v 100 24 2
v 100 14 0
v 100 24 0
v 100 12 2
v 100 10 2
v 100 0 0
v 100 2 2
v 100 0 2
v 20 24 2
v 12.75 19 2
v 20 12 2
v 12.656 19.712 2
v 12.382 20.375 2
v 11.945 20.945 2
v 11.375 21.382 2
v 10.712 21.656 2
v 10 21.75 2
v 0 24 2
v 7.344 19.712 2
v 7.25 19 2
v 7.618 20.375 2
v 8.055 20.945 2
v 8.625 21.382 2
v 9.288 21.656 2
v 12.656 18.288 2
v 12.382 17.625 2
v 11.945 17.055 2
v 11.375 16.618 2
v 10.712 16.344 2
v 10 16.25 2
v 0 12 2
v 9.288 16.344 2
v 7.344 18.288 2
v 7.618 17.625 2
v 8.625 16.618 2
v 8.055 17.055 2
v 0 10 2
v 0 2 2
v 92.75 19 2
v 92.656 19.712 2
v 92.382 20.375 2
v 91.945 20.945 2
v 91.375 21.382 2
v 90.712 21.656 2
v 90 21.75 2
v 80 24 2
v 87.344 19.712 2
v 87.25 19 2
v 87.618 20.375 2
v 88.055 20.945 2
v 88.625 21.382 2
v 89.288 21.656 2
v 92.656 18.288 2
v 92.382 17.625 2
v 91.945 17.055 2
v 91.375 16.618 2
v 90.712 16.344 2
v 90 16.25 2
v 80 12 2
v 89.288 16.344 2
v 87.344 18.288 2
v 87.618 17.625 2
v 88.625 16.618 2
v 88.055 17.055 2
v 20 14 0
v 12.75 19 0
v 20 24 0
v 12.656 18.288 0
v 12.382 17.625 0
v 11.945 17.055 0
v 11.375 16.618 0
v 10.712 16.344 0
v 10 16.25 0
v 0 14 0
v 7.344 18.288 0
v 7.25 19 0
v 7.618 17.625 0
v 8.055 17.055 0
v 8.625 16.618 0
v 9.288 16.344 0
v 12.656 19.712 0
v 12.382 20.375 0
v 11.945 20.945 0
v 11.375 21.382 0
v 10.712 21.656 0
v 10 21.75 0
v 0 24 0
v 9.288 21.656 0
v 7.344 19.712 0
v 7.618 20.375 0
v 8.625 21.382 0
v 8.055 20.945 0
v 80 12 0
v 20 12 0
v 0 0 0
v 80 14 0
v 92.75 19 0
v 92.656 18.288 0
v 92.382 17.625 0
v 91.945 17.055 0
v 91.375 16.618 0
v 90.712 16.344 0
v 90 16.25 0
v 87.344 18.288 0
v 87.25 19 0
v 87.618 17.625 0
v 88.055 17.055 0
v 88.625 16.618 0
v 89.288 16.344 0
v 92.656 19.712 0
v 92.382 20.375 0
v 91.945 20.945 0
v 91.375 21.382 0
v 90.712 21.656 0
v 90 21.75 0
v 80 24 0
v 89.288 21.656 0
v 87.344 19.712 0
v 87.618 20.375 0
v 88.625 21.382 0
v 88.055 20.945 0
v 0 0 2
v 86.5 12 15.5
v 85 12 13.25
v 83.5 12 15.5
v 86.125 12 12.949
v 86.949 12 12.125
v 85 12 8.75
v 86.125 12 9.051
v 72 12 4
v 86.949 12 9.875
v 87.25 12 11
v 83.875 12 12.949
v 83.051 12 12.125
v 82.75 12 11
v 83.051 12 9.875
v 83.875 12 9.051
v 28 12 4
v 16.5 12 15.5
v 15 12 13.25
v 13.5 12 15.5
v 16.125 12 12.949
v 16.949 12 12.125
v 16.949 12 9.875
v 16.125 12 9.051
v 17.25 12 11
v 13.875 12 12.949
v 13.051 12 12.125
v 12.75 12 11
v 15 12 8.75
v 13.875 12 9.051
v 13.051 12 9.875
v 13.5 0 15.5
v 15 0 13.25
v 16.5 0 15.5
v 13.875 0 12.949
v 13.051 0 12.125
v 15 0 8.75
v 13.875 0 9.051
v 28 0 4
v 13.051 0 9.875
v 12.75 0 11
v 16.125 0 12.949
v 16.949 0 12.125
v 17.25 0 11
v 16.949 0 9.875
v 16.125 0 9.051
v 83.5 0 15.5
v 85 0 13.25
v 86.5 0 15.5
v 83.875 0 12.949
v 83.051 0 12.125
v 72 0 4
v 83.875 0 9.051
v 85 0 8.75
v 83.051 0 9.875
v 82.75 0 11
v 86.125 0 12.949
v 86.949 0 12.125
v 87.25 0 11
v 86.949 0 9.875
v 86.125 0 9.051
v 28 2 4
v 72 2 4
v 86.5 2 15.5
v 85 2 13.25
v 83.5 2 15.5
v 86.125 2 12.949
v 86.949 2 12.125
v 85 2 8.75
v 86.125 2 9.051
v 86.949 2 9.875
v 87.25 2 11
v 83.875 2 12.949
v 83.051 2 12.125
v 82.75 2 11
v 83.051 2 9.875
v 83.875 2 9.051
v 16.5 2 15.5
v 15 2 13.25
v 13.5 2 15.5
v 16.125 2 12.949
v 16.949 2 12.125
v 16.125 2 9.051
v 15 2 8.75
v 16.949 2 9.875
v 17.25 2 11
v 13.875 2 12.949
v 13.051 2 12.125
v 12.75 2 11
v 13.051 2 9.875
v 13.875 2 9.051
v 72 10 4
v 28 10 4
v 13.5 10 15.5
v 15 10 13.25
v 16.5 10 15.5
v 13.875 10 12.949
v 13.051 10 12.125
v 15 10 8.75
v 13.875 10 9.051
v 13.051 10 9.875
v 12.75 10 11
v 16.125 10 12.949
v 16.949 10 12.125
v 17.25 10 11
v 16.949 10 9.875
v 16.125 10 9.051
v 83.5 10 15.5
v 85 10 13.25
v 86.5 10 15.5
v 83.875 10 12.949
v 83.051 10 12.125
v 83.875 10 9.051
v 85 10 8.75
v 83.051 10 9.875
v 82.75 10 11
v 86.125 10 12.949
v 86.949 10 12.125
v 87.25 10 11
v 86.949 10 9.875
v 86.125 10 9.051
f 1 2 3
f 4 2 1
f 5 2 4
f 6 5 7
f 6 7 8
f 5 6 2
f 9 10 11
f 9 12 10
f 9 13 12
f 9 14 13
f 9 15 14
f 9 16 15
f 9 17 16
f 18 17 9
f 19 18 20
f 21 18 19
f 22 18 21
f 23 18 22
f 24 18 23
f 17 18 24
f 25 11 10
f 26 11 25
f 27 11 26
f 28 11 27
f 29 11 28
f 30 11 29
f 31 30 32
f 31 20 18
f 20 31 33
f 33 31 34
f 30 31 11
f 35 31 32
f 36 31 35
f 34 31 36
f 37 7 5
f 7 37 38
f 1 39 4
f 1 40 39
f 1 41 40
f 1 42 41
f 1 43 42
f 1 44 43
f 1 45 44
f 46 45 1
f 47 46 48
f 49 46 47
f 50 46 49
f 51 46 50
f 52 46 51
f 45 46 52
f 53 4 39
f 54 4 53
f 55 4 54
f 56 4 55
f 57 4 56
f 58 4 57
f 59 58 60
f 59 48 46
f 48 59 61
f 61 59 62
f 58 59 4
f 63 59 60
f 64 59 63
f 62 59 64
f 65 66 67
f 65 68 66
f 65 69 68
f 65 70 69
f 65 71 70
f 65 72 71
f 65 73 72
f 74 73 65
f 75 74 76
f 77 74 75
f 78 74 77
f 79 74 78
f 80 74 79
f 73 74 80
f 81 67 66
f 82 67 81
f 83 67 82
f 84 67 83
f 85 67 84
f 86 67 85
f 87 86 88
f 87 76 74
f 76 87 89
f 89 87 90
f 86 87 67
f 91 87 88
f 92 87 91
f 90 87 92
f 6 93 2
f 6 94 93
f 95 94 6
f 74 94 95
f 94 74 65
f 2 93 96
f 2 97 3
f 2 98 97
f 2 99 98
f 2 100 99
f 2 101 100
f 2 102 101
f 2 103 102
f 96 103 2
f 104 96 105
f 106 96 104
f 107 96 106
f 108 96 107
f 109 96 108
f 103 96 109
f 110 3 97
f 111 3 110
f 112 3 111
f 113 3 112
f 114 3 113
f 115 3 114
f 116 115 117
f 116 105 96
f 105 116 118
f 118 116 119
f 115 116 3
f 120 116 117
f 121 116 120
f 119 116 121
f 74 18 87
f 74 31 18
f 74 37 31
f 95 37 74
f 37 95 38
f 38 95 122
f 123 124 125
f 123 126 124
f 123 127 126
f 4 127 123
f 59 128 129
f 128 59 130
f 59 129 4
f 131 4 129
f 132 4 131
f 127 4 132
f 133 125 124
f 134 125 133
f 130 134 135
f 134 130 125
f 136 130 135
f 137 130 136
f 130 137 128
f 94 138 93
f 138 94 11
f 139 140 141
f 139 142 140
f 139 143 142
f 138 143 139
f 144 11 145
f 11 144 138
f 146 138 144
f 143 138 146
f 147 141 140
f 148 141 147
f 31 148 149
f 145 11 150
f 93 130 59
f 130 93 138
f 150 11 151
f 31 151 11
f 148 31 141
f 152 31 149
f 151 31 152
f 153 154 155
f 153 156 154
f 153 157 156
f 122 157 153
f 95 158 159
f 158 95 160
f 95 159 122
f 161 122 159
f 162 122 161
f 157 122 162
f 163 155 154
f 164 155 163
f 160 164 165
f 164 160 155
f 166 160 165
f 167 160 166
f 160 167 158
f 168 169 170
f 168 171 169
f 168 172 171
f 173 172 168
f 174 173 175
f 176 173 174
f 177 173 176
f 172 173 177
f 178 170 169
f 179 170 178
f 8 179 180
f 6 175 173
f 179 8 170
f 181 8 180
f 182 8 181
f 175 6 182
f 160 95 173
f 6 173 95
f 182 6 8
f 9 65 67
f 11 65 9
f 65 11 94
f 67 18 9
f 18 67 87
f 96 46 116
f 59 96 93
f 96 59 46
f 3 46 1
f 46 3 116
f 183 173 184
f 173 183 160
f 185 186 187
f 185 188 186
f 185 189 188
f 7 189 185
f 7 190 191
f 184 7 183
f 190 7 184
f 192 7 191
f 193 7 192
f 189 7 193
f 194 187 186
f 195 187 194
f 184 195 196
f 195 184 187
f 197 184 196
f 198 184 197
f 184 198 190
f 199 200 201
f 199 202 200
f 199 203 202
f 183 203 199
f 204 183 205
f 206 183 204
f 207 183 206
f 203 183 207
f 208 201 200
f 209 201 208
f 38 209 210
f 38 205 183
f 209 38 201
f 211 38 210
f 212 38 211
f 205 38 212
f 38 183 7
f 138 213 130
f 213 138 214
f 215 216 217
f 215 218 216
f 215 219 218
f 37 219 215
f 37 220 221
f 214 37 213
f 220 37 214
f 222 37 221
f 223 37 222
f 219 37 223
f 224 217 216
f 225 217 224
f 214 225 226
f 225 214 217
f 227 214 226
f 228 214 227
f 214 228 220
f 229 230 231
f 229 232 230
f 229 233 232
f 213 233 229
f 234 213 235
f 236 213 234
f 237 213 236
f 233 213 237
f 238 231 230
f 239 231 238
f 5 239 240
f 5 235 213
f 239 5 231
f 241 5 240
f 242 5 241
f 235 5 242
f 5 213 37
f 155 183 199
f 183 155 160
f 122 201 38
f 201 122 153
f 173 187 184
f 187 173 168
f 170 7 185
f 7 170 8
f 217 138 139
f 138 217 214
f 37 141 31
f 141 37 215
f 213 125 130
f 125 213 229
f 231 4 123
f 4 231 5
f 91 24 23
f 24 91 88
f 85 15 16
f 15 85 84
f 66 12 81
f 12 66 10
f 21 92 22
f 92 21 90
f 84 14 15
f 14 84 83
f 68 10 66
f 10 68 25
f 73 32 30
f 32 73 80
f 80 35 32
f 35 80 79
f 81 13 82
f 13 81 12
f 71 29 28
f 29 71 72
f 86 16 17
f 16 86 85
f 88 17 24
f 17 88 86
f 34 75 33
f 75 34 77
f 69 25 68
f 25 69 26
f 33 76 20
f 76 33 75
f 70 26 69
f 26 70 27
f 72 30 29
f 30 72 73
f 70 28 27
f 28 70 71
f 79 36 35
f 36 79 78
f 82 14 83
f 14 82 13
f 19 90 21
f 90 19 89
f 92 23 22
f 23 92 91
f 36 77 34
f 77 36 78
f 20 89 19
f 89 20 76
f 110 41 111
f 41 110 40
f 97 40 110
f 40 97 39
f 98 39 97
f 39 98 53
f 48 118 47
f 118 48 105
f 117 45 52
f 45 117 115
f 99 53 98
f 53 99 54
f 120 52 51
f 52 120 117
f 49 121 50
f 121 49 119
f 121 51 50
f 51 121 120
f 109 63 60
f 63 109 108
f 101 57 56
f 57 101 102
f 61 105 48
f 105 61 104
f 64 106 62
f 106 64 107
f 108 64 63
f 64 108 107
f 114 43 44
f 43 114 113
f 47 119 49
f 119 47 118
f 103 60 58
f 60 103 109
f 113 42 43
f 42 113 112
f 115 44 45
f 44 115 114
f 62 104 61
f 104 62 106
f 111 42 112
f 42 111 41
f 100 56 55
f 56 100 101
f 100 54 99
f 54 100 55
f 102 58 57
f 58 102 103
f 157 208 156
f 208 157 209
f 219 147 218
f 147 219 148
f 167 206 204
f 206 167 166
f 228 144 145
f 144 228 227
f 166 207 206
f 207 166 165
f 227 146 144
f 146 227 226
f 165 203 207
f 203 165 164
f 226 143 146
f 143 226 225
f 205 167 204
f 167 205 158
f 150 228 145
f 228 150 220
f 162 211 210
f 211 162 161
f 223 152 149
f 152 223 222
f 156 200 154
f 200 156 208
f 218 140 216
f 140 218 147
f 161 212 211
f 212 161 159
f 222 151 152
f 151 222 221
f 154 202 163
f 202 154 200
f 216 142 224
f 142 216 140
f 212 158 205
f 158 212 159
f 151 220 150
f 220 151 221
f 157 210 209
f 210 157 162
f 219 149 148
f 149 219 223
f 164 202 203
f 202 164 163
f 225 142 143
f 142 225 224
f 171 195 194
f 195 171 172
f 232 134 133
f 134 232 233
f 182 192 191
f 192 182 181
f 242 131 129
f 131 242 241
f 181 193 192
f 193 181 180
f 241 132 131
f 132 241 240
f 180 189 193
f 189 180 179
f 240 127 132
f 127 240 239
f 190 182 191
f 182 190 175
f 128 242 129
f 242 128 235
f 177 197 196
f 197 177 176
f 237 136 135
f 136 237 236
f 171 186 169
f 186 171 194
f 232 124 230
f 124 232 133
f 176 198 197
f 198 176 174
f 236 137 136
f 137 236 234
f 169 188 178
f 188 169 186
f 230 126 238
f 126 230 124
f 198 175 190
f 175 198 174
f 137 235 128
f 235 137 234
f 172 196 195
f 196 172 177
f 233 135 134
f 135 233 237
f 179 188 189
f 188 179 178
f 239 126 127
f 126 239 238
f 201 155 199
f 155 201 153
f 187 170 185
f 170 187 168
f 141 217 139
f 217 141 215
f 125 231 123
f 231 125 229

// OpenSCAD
difference()
{
    union()
    {
        cube([100,12,2]);
        
        cube([20,24,2]);
        
        translate([100-20,0,0])
            cube([20,24,2]);
        
        translate([10,0,0])
            cube([100-20,2,4]);
        translate([10,10,0])
            cube([100-20,2,4]);
        
        translate([0,0,2])
            rotate([0,45,0])
                cube([15*sqrt(2),2,15*sqrt(2)]);
        
        translate([100,0,2])
            rotate([0,45+180,0])
                cube([15*sqrt(2),2,15*sqrt(2)]);
        
        translate([0,10,2])
            rotate([0,45,0])
                cube([15*sqrt(2),2,15*sqrt(2)]);
        
        translate([100,10,2])
            rotate([0,45+180,0])
                cube([15*sqrt(2),2,15*sqrt(2)]);
    }
    union()
    {
        translate([10,14+5,0])
            cylinder(d=5.5,h=3,$fn=24);
        translate([100-10,14+5,0])
            cylinder(d=5.5,h=3,$fn=24);
        
        translate([15,0,11])
            rotate([270,0,0])
                cylinder(d=4.5,h=20,$fn=12);
        translate([100-15,0,11])
            rotate([270,0,0])
                cylinder(d=4.5,h=20,$fn=12);
        
        translate([0,0,-20])
            cube([100,14,20]);
        
        translate([0,0,11+3.5+1])
            cube([100,14,20]);
    }
}
